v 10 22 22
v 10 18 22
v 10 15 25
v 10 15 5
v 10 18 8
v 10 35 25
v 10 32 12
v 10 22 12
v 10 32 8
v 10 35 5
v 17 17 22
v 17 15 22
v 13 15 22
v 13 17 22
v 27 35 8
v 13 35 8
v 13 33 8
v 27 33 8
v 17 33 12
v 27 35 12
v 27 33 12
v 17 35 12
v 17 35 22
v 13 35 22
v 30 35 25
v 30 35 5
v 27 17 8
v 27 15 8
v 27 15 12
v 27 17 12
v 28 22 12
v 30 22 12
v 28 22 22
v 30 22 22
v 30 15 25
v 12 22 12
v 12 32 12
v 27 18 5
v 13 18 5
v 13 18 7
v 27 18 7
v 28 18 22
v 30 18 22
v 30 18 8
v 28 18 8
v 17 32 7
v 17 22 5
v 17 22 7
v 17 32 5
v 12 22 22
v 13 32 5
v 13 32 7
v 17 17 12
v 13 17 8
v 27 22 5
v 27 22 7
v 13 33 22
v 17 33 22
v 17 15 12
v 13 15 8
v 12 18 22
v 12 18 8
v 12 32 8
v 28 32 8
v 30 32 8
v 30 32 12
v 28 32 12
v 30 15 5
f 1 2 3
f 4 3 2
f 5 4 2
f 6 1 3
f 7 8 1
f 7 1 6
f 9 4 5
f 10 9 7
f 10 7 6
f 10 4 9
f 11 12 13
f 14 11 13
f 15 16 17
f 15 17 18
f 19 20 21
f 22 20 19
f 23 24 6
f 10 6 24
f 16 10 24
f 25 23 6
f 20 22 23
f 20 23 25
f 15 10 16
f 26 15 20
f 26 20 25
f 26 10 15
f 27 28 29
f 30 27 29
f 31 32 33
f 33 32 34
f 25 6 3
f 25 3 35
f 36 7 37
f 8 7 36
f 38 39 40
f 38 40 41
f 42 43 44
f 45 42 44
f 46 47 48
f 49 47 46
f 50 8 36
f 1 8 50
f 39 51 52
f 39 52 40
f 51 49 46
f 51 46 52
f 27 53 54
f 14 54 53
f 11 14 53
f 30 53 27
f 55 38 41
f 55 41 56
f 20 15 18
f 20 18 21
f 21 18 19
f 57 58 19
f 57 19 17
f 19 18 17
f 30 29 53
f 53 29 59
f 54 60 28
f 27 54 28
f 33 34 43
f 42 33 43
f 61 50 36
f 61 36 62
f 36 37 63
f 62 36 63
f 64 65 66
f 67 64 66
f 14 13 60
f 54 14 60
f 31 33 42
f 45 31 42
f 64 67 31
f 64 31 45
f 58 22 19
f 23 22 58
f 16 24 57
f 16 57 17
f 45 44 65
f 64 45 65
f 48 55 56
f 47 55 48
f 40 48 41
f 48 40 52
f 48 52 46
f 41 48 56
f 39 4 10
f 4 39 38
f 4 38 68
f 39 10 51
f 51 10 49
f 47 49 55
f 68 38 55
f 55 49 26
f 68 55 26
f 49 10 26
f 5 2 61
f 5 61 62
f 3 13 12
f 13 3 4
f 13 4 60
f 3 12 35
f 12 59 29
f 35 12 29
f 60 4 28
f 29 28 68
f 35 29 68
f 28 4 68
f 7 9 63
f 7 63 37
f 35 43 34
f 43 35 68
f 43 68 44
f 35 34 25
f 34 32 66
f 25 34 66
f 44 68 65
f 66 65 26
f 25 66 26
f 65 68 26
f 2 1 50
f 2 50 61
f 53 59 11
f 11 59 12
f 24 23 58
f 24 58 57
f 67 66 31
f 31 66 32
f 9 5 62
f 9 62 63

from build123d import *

# Parameters (mm, degrees)
SKETCH1_W           = 20
SKETCH1_H           = 20
BOSS_EXTRUDE1_DEPTH = 20
CUT_EXTRUDE1_DEPTH  = 2
CUT_EXTRUDE2_DEPTH  = 2
CUT_EXTRUDE3_DEPTH  = 2
CUT_EXTRUDE4_DEPTH  = 2
CUT_EXTRUDE5_DEPTH  = 2


with BuildPart() as part:
    # Sketch1 → Boss-Extrude1 (new body)
    with BuildSketch(Plane.XY.offset(5)):
        with Locations((20, 25)):
            Rectangle(SKETCH1_W, SKETCH1_H)
    extrude(amount=BOSS_EXTRUDE1_DEPTH)

    # Sketch2 → Cut-Extrude1 (cut)
    with BuildSketch(Plane(origin=(30, 0, 0), x_dir=(0, 0, -1), z_dir=(1, 0, 0))):
        Polygon((-8, 18), (-8, 32), (-12, 32), (-12, 22), (-22, 22), (-22, 18), align=None)
    extrude(amount=-CUT_EXTRUDE1_DEPTH, mode=Mode.SUBTRACT)

    # Sketch3 → Cut-Extrude2 (cut)
    with BuildSketch(Plane.ZY.offset(-10)):
        Polygon((8, 18), (8, 32), (12, 32), (12, 22), (22, 22), (22, 18), align=None)
    extrude(amount=-CUT_EXTRUDE2_DEPTH, mode=Mode.SUBTRACT)

    # Sketch4 → Cut-Extrude3 (cut)
    with BuildSketch(Plane(origin=(0, 35, 0), x_dir=(1, 0, 0), z_dir=(0, 1, 0))):
        Polygon((13, -8), (27, -8), (27, -12), (17, -12), (17, -22), (13, -22), align=None)
    extrude(amount=-CUT_EXTRUDE3_DEPTH, mode=Mode.SUBTRACT)

    # Sketch5 → Cut-Extrude4 (cut)
    with BuildSketch(Plane.XZ.offset(-15)):
        Polygon((13, 8), (27, 8), (27, 12), (17, 12), (17, 22), (13, 22), align=None)
    extrude(amount=-CUT_EXTRUDE4_DEPTH, mode=Mode.SUBTRACT)

    # Sketch6 → Cut-Extrude5 (cut)
    with BuildSketch(Plane(origin=(0, 0, 5), x_dir=(-1, 0, 0), z_dir=(0, 0, -1))):
        Polygon((-13, 18), (-27, 18), (-27, 22), (-17, 22), (-17, 32), (-13, 32), align=None)
    extrude(amount=-CUT_EXTRUDE5_DEPTH, mode=Mode.SUBTRACT)


solid = part.part
